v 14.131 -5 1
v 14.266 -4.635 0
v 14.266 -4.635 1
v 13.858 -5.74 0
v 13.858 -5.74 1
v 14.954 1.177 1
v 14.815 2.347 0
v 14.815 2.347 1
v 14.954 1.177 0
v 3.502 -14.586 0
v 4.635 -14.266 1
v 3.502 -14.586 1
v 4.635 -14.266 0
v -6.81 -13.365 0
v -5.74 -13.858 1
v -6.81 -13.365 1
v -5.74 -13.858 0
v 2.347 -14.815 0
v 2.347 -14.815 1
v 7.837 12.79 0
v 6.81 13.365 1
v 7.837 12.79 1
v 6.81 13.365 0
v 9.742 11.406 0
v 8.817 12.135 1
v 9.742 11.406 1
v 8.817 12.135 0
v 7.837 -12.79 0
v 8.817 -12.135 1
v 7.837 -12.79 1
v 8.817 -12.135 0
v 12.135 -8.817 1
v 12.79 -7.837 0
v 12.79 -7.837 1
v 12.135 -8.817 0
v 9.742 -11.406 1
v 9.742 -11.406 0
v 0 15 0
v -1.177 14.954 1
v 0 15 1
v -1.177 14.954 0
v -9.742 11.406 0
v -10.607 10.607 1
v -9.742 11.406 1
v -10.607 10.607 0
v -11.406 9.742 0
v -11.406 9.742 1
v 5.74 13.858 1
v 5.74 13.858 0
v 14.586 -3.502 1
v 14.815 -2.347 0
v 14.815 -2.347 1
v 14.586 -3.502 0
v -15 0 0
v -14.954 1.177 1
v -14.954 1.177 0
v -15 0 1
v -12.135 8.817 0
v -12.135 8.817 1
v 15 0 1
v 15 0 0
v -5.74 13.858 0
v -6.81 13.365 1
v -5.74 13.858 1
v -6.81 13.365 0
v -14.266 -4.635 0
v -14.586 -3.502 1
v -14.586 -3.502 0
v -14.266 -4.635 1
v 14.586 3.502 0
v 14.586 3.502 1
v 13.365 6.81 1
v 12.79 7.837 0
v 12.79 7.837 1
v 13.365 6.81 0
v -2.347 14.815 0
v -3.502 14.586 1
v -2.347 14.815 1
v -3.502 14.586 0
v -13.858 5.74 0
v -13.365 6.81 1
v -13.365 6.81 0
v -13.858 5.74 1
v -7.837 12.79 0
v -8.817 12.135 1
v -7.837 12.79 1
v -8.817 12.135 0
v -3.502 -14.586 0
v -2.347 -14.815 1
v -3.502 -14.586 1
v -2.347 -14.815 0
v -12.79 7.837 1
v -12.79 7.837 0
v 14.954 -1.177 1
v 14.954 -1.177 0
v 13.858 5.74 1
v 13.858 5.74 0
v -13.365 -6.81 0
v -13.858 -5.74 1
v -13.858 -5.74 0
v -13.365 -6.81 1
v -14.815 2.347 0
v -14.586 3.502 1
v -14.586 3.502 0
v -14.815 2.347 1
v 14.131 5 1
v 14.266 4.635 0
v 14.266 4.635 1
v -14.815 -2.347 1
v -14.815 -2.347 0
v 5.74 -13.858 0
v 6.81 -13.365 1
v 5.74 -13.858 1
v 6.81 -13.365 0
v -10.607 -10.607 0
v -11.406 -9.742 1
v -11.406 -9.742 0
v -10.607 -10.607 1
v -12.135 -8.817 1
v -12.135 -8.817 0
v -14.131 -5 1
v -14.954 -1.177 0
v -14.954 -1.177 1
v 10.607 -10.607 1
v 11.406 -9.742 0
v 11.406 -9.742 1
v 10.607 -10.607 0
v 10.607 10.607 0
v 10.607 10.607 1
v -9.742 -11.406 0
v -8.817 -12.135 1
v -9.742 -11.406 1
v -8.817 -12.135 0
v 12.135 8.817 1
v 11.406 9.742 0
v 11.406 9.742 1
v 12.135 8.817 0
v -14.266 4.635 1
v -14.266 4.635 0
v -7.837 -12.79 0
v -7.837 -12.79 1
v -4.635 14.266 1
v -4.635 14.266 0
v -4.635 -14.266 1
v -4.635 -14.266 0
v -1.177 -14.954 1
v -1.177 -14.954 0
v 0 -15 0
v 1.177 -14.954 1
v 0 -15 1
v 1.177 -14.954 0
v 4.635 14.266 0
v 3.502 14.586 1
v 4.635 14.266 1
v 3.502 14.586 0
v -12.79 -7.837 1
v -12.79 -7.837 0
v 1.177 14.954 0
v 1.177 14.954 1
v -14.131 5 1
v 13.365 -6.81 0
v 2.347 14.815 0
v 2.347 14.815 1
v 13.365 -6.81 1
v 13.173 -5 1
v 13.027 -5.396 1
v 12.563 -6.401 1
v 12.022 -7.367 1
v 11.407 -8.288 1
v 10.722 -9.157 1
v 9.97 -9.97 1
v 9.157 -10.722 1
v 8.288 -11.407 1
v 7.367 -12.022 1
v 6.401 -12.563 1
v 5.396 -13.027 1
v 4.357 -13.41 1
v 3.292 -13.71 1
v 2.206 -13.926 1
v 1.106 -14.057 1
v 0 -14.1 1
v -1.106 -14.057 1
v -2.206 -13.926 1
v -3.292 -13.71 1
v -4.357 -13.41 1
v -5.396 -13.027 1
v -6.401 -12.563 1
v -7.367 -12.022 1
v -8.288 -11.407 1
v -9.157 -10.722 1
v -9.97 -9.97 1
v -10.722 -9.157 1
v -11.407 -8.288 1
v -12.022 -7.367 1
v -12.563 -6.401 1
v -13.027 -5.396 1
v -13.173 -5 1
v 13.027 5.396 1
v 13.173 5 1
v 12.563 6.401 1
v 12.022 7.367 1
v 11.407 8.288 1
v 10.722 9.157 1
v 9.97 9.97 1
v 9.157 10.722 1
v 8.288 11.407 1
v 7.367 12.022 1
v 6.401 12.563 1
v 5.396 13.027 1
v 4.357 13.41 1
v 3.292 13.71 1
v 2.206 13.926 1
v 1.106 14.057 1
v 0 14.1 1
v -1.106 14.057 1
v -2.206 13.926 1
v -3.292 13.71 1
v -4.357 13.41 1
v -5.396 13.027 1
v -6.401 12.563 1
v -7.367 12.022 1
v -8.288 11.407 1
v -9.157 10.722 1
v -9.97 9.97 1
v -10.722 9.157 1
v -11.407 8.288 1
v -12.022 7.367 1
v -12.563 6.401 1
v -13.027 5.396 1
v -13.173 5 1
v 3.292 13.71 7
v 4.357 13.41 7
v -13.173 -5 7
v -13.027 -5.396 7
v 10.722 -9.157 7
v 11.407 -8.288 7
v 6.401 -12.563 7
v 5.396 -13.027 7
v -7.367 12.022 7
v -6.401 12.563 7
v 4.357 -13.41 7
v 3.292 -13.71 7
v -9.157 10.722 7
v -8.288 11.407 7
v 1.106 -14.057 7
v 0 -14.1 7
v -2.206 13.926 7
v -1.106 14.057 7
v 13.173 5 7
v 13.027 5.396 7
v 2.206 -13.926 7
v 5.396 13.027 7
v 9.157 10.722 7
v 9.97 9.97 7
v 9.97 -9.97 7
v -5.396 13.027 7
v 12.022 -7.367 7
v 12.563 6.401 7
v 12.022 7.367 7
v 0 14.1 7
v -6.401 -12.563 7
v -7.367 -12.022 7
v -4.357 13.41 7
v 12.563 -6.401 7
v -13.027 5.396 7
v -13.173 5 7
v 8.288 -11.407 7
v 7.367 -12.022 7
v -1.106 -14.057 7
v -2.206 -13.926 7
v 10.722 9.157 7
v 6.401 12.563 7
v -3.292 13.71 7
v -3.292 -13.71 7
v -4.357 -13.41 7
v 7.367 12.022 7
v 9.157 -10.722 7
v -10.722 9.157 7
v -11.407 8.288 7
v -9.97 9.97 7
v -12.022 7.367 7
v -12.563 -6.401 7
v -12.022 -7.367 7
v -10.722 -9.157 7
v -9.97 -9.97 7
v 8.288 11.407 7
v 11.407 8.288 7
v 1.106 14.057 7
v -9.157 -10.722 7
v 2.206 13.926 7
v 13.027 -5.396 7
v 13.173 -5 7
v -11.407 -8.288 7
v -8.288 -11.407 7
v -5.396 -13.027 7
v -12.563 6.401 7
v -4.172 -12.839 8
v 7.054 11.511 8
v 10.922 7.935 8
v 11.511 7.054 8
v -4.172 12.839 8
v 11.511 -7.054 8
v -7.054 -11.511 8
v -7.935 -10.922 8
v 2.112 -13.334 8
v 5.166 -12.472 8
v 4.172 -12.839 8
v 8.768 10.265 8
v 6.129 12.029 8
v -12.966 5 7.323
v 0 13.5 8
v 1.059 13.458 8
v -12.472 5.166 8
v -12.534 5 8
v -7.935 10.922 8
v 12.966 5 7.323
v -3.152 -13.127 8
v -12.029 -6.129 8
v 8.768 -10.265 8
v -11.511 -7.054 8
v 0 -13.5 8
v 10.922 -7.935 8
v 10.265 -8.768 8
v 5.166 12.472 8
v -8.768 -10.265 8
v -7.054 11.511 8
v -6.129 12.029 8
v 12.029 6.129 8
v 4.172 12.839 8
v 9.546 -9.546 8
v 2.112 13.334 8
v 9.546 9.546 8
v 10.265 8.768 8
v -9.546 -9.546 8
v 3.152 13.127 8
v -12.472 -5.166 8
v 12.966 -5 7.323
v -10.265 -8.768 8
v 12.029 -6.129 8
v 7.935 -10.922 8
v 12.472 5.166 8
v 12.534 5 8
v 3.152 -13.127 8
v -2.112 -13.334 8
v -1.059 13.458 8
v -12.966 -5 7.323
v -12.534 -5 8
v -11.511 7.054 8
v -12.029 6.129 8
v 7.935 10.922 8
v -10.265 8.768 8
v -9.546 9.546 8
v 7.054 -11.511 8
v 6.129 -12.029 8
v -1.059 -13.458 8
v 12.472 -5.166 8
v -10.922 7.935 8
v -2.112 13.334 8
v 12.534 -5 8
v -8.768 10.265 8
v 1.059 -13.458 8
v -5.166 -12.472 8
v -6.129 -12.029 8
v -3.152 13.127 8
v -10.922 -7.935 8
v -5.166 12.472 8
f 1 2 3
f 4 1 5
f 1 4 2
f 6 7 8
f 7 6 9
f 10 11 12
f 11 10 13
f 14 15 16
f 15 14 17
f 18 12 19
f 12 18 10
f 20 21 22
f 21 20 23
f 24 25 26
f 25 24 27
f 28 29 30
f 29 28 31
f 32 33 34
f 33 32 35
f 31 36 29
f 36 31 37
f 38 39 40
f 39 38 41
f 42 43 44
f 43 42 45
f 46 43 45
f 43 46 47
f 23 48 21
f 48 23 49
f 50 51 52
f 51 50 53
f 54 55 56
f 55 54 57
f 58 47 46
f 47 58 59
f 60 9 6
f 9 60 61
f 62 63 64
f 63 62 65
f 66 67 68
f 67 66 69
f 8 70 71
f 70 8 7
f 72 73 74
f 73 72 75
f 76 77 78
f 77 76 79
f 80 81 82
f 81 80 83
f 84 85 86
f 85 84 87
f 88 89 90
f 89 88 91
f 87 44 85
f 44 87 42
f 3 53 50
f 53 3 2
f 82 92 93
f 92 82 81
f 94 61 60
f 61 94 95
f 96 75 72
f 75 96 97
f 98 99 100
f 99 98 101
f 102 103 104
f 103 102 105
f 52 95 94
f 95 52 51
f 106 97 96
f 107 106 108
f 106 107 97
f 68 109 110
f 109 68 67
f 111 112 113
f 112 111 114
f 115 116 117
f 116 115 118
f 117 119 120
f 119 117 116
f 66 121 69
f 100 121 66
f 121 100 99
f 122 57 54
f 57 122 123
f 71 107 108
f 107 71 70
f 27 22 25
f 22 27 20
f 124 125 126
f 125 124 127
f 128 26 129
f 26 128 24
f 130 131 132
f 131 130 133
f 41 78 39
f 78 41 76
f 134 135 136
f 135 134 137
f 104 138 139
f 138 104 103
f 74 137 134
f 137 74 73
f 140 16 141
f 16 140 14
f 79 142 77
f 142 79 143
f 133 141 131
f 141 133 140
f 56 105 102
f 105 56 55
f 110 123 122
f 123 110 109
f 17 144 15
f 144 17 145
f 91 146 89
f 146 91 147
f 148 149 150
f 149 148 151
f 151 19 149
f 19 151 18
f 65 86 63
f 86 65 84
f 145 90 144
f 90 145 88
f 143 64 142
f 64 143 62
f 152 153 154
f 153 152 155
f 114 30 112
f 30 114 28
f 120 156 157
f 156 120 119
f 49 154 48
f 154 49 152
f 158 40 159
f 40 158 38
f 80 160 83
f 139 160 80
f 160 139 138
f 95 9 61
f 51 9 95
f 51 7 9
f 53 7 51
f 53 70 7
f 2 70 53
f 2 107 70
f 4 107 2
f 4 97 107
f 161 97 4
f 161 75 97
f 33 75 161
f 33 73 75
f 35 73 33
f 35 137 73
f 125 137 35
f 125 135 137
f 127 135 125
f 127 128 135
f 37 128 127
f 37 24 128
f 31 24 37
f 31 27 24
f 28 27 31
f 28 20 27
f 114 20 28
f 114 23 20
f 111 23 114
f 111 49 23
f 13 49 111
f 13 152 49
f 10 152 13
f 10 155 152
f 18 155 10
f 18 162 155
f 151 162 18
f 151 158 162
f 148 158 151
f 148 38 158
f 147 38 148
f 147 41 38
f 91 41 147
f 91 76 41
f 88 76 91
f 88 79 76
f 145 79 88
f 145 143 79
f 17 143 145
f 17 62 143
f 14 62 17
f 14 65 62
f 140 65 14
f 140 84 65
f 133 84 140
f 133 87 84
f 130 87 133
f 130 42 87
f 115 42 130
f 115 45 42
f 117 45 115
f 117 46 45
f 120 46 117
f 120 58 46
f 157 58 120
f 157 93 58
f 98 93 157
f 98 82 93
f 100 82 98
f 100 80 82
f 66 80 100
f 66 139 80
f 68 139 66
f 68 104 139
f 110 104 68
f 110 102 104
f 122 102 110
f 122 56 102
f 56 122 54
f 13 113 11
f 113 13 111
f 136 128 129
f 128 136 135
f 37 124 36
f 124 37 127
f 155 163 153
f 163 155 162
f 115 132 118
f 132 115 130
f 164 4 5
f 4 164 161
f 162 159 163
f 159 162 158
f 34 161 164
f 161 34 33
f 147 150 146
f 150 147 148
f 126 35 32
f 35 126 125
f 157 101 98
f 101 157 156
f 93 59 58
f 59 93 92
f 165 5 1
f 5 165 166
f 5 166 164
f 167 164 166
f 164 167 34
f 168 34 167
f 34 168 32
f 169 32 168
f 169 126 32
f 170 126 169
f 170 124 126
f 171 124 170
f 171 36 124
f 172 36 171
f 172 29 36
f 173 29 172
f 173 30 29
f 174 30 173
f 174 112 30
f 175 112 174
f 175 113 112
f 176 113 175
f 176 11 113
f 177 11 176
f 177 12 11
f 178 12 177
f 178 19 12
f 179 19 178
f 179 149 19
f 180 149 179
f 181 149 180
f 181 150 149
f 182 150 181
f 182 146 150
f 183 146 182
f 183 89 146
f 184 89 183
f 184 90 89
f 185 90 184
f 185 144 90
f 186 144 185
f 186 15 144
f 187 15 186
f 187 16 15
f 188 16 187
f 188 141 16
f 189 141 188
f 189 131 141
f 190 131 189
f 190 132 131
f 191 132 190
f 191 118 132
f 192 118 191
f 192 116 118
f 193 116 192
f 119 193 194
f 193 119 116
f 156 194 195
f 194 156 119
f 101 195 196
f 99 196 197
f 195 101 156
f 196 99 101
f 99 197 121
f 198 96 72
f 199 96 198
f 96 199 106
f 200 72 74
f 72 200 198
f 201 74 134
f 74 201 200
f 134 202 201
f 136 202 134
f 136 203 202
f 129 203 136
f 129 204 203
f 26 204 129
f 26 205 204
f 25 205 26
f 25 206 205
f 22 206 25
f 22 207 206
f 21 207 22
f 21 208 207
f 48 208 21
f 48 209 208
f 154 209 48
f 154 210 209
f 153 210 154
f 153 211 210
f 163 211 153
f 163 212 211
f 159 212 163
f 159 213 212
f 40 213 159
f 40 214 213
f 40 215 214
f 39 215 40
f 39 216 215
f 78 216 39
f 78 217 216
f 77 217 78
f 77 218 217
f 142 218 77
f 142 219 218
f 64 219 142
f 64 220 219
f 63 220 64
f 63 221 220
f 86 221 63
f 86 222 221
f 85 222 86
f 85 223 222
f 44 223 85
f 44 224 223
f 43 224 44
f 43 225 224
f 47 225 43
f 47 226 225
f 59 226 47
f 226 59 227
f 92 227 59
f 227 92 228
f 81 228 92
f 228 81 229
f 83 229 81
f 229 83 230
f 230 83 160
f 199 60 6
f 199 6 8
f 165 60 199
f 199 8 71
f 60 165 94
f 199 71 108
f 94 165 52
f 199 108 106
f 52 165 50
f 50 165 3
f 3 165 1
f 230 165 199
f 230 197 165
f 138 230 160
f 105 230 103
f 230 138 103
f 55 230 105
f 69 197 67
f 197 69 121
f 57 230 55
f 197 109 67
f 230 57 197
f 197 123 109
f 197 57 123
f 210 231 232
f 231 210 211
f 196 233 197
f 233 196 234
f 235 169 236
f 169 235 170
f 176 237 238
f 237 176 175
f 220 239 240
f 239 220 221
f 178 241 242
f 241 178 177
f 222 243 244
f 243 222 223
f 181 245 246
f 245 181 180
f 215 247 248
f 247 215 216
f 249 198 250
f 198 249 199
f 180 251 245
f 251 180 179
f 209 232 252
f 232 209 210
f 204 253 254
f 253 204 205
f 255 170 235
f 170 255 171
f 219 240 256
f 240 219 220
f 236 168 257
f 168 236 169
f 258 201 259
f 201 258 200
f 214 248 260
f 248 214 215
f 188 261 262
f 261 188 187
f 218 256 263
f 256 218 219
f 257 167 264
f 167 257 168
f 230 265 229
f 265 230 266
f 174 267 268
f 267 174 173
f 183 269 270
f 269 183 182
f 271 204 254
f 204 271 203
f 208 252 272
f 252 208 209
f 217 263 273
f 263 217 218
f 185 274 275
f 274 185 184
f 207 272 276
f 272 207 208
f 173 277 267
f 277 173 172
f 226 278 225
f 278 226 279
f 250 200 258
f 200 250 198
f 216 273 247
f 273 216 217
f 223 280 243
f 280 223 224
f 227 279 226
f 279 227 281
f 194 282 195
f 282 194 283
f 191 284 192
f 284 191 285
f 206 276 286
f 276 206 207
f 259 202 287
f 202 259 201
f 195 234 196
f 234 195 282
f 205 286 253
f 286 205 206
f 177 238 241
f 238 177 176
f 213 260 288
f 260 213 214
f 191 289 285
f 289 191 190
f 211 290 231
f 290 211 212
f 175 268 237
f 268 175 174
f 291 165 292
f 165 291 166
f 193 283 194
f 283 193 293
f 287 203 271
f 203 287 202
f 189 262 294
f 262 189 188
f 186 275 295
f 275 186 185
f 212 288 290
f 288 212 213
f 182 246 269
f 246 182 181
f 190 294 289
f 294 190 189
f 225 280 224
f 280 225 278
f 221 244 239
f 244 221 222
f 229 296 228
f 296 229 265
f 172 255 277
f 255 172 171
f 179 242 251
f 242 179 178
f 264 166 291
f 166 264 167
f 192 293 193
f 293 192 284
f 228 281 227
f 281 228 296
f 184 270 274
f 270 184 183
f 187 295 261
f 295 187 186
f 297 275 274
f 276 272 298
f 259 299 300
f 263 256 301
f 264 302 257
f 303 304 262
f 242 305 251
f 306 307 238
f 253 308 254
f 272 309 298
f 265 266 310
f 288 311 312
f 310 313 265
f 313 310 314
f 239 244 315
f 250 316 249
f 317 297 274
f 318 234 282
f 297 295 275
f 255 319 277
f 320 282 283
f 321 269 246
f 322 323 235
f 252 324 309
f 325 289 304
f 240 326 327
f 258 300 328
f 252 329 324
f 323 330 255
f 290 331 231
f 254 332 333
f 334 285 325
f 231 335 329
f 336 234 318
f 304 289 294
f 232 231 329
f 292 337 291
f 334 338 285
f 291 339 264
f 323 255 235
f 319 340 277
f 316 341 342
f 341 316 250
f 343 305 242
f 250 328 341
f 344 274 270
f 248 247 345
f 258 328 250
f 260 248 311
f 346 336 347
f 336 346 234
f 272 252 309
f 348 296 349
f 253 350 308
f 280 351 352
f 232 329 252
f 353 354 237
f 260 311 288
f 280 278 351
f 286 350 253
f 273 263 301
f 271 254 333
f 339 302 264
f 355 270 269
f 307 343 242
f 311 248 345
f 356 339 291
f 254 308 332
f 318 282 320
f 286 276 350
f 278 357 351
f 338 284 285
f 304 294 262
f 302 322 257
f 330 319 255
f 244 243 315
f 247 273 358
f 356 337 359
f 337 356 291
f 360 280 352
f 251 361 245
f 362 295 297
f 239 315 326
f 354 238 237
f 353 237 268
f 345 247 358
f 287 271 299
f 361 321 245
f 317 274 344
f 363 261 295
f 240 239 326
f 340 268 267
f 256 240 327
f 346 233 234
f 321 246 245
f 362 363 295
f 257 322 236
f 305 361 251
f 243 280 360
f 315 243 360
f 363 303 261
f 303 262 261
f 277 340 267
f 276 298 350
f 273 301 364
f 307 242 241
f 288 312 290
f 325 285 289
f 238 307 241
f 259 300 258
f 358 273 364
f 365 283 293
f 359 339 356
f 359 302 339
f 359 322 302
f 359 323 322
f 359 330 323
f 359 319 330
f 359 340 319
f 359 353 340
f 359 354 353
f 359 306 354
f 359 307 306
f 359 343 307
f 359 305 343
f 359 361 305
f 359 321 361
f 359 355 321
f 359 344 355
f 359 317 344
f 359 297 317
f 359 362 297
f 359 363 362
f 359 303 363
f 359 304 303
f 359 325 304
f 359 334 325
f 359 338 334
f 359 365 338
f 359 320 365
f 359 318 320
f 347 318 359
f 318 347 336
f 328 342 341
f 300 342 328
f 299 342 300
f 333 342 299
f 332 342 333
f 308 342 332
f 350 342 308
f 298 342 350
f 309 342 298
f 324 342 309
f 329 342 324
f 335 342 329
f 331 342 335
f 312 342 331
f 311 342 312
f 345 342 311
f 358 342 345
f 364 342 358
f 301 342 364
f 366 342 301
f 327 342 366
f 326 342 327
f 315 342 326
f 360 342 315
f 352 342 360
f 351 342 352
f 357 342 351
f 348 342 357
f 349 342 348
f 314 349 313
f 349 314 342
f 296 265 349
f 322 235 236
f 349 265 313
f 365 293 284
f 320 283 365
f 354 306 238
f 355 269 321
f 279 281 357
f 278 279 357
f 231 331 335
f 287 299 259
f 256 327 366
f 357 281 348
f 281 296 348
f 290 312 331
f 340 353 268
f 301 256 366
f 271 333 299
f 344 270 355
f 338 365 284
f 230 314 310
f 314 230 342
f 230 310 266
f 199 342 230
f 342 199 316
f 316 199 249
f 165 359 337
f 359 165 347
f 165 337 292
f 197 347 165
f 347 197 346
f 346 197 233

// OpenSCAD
$fn=80;
difference() {
  union() {
    cylinder(h=1,d=30);
    translate([0,0,1]) cylinder(h=6,d=28.2);
    translate([0,0,7]) cylinder(h=1,d1=28.2,d2=27);
  }
  translate([0,0,6])  cube([30,10,10],center=true);
}
